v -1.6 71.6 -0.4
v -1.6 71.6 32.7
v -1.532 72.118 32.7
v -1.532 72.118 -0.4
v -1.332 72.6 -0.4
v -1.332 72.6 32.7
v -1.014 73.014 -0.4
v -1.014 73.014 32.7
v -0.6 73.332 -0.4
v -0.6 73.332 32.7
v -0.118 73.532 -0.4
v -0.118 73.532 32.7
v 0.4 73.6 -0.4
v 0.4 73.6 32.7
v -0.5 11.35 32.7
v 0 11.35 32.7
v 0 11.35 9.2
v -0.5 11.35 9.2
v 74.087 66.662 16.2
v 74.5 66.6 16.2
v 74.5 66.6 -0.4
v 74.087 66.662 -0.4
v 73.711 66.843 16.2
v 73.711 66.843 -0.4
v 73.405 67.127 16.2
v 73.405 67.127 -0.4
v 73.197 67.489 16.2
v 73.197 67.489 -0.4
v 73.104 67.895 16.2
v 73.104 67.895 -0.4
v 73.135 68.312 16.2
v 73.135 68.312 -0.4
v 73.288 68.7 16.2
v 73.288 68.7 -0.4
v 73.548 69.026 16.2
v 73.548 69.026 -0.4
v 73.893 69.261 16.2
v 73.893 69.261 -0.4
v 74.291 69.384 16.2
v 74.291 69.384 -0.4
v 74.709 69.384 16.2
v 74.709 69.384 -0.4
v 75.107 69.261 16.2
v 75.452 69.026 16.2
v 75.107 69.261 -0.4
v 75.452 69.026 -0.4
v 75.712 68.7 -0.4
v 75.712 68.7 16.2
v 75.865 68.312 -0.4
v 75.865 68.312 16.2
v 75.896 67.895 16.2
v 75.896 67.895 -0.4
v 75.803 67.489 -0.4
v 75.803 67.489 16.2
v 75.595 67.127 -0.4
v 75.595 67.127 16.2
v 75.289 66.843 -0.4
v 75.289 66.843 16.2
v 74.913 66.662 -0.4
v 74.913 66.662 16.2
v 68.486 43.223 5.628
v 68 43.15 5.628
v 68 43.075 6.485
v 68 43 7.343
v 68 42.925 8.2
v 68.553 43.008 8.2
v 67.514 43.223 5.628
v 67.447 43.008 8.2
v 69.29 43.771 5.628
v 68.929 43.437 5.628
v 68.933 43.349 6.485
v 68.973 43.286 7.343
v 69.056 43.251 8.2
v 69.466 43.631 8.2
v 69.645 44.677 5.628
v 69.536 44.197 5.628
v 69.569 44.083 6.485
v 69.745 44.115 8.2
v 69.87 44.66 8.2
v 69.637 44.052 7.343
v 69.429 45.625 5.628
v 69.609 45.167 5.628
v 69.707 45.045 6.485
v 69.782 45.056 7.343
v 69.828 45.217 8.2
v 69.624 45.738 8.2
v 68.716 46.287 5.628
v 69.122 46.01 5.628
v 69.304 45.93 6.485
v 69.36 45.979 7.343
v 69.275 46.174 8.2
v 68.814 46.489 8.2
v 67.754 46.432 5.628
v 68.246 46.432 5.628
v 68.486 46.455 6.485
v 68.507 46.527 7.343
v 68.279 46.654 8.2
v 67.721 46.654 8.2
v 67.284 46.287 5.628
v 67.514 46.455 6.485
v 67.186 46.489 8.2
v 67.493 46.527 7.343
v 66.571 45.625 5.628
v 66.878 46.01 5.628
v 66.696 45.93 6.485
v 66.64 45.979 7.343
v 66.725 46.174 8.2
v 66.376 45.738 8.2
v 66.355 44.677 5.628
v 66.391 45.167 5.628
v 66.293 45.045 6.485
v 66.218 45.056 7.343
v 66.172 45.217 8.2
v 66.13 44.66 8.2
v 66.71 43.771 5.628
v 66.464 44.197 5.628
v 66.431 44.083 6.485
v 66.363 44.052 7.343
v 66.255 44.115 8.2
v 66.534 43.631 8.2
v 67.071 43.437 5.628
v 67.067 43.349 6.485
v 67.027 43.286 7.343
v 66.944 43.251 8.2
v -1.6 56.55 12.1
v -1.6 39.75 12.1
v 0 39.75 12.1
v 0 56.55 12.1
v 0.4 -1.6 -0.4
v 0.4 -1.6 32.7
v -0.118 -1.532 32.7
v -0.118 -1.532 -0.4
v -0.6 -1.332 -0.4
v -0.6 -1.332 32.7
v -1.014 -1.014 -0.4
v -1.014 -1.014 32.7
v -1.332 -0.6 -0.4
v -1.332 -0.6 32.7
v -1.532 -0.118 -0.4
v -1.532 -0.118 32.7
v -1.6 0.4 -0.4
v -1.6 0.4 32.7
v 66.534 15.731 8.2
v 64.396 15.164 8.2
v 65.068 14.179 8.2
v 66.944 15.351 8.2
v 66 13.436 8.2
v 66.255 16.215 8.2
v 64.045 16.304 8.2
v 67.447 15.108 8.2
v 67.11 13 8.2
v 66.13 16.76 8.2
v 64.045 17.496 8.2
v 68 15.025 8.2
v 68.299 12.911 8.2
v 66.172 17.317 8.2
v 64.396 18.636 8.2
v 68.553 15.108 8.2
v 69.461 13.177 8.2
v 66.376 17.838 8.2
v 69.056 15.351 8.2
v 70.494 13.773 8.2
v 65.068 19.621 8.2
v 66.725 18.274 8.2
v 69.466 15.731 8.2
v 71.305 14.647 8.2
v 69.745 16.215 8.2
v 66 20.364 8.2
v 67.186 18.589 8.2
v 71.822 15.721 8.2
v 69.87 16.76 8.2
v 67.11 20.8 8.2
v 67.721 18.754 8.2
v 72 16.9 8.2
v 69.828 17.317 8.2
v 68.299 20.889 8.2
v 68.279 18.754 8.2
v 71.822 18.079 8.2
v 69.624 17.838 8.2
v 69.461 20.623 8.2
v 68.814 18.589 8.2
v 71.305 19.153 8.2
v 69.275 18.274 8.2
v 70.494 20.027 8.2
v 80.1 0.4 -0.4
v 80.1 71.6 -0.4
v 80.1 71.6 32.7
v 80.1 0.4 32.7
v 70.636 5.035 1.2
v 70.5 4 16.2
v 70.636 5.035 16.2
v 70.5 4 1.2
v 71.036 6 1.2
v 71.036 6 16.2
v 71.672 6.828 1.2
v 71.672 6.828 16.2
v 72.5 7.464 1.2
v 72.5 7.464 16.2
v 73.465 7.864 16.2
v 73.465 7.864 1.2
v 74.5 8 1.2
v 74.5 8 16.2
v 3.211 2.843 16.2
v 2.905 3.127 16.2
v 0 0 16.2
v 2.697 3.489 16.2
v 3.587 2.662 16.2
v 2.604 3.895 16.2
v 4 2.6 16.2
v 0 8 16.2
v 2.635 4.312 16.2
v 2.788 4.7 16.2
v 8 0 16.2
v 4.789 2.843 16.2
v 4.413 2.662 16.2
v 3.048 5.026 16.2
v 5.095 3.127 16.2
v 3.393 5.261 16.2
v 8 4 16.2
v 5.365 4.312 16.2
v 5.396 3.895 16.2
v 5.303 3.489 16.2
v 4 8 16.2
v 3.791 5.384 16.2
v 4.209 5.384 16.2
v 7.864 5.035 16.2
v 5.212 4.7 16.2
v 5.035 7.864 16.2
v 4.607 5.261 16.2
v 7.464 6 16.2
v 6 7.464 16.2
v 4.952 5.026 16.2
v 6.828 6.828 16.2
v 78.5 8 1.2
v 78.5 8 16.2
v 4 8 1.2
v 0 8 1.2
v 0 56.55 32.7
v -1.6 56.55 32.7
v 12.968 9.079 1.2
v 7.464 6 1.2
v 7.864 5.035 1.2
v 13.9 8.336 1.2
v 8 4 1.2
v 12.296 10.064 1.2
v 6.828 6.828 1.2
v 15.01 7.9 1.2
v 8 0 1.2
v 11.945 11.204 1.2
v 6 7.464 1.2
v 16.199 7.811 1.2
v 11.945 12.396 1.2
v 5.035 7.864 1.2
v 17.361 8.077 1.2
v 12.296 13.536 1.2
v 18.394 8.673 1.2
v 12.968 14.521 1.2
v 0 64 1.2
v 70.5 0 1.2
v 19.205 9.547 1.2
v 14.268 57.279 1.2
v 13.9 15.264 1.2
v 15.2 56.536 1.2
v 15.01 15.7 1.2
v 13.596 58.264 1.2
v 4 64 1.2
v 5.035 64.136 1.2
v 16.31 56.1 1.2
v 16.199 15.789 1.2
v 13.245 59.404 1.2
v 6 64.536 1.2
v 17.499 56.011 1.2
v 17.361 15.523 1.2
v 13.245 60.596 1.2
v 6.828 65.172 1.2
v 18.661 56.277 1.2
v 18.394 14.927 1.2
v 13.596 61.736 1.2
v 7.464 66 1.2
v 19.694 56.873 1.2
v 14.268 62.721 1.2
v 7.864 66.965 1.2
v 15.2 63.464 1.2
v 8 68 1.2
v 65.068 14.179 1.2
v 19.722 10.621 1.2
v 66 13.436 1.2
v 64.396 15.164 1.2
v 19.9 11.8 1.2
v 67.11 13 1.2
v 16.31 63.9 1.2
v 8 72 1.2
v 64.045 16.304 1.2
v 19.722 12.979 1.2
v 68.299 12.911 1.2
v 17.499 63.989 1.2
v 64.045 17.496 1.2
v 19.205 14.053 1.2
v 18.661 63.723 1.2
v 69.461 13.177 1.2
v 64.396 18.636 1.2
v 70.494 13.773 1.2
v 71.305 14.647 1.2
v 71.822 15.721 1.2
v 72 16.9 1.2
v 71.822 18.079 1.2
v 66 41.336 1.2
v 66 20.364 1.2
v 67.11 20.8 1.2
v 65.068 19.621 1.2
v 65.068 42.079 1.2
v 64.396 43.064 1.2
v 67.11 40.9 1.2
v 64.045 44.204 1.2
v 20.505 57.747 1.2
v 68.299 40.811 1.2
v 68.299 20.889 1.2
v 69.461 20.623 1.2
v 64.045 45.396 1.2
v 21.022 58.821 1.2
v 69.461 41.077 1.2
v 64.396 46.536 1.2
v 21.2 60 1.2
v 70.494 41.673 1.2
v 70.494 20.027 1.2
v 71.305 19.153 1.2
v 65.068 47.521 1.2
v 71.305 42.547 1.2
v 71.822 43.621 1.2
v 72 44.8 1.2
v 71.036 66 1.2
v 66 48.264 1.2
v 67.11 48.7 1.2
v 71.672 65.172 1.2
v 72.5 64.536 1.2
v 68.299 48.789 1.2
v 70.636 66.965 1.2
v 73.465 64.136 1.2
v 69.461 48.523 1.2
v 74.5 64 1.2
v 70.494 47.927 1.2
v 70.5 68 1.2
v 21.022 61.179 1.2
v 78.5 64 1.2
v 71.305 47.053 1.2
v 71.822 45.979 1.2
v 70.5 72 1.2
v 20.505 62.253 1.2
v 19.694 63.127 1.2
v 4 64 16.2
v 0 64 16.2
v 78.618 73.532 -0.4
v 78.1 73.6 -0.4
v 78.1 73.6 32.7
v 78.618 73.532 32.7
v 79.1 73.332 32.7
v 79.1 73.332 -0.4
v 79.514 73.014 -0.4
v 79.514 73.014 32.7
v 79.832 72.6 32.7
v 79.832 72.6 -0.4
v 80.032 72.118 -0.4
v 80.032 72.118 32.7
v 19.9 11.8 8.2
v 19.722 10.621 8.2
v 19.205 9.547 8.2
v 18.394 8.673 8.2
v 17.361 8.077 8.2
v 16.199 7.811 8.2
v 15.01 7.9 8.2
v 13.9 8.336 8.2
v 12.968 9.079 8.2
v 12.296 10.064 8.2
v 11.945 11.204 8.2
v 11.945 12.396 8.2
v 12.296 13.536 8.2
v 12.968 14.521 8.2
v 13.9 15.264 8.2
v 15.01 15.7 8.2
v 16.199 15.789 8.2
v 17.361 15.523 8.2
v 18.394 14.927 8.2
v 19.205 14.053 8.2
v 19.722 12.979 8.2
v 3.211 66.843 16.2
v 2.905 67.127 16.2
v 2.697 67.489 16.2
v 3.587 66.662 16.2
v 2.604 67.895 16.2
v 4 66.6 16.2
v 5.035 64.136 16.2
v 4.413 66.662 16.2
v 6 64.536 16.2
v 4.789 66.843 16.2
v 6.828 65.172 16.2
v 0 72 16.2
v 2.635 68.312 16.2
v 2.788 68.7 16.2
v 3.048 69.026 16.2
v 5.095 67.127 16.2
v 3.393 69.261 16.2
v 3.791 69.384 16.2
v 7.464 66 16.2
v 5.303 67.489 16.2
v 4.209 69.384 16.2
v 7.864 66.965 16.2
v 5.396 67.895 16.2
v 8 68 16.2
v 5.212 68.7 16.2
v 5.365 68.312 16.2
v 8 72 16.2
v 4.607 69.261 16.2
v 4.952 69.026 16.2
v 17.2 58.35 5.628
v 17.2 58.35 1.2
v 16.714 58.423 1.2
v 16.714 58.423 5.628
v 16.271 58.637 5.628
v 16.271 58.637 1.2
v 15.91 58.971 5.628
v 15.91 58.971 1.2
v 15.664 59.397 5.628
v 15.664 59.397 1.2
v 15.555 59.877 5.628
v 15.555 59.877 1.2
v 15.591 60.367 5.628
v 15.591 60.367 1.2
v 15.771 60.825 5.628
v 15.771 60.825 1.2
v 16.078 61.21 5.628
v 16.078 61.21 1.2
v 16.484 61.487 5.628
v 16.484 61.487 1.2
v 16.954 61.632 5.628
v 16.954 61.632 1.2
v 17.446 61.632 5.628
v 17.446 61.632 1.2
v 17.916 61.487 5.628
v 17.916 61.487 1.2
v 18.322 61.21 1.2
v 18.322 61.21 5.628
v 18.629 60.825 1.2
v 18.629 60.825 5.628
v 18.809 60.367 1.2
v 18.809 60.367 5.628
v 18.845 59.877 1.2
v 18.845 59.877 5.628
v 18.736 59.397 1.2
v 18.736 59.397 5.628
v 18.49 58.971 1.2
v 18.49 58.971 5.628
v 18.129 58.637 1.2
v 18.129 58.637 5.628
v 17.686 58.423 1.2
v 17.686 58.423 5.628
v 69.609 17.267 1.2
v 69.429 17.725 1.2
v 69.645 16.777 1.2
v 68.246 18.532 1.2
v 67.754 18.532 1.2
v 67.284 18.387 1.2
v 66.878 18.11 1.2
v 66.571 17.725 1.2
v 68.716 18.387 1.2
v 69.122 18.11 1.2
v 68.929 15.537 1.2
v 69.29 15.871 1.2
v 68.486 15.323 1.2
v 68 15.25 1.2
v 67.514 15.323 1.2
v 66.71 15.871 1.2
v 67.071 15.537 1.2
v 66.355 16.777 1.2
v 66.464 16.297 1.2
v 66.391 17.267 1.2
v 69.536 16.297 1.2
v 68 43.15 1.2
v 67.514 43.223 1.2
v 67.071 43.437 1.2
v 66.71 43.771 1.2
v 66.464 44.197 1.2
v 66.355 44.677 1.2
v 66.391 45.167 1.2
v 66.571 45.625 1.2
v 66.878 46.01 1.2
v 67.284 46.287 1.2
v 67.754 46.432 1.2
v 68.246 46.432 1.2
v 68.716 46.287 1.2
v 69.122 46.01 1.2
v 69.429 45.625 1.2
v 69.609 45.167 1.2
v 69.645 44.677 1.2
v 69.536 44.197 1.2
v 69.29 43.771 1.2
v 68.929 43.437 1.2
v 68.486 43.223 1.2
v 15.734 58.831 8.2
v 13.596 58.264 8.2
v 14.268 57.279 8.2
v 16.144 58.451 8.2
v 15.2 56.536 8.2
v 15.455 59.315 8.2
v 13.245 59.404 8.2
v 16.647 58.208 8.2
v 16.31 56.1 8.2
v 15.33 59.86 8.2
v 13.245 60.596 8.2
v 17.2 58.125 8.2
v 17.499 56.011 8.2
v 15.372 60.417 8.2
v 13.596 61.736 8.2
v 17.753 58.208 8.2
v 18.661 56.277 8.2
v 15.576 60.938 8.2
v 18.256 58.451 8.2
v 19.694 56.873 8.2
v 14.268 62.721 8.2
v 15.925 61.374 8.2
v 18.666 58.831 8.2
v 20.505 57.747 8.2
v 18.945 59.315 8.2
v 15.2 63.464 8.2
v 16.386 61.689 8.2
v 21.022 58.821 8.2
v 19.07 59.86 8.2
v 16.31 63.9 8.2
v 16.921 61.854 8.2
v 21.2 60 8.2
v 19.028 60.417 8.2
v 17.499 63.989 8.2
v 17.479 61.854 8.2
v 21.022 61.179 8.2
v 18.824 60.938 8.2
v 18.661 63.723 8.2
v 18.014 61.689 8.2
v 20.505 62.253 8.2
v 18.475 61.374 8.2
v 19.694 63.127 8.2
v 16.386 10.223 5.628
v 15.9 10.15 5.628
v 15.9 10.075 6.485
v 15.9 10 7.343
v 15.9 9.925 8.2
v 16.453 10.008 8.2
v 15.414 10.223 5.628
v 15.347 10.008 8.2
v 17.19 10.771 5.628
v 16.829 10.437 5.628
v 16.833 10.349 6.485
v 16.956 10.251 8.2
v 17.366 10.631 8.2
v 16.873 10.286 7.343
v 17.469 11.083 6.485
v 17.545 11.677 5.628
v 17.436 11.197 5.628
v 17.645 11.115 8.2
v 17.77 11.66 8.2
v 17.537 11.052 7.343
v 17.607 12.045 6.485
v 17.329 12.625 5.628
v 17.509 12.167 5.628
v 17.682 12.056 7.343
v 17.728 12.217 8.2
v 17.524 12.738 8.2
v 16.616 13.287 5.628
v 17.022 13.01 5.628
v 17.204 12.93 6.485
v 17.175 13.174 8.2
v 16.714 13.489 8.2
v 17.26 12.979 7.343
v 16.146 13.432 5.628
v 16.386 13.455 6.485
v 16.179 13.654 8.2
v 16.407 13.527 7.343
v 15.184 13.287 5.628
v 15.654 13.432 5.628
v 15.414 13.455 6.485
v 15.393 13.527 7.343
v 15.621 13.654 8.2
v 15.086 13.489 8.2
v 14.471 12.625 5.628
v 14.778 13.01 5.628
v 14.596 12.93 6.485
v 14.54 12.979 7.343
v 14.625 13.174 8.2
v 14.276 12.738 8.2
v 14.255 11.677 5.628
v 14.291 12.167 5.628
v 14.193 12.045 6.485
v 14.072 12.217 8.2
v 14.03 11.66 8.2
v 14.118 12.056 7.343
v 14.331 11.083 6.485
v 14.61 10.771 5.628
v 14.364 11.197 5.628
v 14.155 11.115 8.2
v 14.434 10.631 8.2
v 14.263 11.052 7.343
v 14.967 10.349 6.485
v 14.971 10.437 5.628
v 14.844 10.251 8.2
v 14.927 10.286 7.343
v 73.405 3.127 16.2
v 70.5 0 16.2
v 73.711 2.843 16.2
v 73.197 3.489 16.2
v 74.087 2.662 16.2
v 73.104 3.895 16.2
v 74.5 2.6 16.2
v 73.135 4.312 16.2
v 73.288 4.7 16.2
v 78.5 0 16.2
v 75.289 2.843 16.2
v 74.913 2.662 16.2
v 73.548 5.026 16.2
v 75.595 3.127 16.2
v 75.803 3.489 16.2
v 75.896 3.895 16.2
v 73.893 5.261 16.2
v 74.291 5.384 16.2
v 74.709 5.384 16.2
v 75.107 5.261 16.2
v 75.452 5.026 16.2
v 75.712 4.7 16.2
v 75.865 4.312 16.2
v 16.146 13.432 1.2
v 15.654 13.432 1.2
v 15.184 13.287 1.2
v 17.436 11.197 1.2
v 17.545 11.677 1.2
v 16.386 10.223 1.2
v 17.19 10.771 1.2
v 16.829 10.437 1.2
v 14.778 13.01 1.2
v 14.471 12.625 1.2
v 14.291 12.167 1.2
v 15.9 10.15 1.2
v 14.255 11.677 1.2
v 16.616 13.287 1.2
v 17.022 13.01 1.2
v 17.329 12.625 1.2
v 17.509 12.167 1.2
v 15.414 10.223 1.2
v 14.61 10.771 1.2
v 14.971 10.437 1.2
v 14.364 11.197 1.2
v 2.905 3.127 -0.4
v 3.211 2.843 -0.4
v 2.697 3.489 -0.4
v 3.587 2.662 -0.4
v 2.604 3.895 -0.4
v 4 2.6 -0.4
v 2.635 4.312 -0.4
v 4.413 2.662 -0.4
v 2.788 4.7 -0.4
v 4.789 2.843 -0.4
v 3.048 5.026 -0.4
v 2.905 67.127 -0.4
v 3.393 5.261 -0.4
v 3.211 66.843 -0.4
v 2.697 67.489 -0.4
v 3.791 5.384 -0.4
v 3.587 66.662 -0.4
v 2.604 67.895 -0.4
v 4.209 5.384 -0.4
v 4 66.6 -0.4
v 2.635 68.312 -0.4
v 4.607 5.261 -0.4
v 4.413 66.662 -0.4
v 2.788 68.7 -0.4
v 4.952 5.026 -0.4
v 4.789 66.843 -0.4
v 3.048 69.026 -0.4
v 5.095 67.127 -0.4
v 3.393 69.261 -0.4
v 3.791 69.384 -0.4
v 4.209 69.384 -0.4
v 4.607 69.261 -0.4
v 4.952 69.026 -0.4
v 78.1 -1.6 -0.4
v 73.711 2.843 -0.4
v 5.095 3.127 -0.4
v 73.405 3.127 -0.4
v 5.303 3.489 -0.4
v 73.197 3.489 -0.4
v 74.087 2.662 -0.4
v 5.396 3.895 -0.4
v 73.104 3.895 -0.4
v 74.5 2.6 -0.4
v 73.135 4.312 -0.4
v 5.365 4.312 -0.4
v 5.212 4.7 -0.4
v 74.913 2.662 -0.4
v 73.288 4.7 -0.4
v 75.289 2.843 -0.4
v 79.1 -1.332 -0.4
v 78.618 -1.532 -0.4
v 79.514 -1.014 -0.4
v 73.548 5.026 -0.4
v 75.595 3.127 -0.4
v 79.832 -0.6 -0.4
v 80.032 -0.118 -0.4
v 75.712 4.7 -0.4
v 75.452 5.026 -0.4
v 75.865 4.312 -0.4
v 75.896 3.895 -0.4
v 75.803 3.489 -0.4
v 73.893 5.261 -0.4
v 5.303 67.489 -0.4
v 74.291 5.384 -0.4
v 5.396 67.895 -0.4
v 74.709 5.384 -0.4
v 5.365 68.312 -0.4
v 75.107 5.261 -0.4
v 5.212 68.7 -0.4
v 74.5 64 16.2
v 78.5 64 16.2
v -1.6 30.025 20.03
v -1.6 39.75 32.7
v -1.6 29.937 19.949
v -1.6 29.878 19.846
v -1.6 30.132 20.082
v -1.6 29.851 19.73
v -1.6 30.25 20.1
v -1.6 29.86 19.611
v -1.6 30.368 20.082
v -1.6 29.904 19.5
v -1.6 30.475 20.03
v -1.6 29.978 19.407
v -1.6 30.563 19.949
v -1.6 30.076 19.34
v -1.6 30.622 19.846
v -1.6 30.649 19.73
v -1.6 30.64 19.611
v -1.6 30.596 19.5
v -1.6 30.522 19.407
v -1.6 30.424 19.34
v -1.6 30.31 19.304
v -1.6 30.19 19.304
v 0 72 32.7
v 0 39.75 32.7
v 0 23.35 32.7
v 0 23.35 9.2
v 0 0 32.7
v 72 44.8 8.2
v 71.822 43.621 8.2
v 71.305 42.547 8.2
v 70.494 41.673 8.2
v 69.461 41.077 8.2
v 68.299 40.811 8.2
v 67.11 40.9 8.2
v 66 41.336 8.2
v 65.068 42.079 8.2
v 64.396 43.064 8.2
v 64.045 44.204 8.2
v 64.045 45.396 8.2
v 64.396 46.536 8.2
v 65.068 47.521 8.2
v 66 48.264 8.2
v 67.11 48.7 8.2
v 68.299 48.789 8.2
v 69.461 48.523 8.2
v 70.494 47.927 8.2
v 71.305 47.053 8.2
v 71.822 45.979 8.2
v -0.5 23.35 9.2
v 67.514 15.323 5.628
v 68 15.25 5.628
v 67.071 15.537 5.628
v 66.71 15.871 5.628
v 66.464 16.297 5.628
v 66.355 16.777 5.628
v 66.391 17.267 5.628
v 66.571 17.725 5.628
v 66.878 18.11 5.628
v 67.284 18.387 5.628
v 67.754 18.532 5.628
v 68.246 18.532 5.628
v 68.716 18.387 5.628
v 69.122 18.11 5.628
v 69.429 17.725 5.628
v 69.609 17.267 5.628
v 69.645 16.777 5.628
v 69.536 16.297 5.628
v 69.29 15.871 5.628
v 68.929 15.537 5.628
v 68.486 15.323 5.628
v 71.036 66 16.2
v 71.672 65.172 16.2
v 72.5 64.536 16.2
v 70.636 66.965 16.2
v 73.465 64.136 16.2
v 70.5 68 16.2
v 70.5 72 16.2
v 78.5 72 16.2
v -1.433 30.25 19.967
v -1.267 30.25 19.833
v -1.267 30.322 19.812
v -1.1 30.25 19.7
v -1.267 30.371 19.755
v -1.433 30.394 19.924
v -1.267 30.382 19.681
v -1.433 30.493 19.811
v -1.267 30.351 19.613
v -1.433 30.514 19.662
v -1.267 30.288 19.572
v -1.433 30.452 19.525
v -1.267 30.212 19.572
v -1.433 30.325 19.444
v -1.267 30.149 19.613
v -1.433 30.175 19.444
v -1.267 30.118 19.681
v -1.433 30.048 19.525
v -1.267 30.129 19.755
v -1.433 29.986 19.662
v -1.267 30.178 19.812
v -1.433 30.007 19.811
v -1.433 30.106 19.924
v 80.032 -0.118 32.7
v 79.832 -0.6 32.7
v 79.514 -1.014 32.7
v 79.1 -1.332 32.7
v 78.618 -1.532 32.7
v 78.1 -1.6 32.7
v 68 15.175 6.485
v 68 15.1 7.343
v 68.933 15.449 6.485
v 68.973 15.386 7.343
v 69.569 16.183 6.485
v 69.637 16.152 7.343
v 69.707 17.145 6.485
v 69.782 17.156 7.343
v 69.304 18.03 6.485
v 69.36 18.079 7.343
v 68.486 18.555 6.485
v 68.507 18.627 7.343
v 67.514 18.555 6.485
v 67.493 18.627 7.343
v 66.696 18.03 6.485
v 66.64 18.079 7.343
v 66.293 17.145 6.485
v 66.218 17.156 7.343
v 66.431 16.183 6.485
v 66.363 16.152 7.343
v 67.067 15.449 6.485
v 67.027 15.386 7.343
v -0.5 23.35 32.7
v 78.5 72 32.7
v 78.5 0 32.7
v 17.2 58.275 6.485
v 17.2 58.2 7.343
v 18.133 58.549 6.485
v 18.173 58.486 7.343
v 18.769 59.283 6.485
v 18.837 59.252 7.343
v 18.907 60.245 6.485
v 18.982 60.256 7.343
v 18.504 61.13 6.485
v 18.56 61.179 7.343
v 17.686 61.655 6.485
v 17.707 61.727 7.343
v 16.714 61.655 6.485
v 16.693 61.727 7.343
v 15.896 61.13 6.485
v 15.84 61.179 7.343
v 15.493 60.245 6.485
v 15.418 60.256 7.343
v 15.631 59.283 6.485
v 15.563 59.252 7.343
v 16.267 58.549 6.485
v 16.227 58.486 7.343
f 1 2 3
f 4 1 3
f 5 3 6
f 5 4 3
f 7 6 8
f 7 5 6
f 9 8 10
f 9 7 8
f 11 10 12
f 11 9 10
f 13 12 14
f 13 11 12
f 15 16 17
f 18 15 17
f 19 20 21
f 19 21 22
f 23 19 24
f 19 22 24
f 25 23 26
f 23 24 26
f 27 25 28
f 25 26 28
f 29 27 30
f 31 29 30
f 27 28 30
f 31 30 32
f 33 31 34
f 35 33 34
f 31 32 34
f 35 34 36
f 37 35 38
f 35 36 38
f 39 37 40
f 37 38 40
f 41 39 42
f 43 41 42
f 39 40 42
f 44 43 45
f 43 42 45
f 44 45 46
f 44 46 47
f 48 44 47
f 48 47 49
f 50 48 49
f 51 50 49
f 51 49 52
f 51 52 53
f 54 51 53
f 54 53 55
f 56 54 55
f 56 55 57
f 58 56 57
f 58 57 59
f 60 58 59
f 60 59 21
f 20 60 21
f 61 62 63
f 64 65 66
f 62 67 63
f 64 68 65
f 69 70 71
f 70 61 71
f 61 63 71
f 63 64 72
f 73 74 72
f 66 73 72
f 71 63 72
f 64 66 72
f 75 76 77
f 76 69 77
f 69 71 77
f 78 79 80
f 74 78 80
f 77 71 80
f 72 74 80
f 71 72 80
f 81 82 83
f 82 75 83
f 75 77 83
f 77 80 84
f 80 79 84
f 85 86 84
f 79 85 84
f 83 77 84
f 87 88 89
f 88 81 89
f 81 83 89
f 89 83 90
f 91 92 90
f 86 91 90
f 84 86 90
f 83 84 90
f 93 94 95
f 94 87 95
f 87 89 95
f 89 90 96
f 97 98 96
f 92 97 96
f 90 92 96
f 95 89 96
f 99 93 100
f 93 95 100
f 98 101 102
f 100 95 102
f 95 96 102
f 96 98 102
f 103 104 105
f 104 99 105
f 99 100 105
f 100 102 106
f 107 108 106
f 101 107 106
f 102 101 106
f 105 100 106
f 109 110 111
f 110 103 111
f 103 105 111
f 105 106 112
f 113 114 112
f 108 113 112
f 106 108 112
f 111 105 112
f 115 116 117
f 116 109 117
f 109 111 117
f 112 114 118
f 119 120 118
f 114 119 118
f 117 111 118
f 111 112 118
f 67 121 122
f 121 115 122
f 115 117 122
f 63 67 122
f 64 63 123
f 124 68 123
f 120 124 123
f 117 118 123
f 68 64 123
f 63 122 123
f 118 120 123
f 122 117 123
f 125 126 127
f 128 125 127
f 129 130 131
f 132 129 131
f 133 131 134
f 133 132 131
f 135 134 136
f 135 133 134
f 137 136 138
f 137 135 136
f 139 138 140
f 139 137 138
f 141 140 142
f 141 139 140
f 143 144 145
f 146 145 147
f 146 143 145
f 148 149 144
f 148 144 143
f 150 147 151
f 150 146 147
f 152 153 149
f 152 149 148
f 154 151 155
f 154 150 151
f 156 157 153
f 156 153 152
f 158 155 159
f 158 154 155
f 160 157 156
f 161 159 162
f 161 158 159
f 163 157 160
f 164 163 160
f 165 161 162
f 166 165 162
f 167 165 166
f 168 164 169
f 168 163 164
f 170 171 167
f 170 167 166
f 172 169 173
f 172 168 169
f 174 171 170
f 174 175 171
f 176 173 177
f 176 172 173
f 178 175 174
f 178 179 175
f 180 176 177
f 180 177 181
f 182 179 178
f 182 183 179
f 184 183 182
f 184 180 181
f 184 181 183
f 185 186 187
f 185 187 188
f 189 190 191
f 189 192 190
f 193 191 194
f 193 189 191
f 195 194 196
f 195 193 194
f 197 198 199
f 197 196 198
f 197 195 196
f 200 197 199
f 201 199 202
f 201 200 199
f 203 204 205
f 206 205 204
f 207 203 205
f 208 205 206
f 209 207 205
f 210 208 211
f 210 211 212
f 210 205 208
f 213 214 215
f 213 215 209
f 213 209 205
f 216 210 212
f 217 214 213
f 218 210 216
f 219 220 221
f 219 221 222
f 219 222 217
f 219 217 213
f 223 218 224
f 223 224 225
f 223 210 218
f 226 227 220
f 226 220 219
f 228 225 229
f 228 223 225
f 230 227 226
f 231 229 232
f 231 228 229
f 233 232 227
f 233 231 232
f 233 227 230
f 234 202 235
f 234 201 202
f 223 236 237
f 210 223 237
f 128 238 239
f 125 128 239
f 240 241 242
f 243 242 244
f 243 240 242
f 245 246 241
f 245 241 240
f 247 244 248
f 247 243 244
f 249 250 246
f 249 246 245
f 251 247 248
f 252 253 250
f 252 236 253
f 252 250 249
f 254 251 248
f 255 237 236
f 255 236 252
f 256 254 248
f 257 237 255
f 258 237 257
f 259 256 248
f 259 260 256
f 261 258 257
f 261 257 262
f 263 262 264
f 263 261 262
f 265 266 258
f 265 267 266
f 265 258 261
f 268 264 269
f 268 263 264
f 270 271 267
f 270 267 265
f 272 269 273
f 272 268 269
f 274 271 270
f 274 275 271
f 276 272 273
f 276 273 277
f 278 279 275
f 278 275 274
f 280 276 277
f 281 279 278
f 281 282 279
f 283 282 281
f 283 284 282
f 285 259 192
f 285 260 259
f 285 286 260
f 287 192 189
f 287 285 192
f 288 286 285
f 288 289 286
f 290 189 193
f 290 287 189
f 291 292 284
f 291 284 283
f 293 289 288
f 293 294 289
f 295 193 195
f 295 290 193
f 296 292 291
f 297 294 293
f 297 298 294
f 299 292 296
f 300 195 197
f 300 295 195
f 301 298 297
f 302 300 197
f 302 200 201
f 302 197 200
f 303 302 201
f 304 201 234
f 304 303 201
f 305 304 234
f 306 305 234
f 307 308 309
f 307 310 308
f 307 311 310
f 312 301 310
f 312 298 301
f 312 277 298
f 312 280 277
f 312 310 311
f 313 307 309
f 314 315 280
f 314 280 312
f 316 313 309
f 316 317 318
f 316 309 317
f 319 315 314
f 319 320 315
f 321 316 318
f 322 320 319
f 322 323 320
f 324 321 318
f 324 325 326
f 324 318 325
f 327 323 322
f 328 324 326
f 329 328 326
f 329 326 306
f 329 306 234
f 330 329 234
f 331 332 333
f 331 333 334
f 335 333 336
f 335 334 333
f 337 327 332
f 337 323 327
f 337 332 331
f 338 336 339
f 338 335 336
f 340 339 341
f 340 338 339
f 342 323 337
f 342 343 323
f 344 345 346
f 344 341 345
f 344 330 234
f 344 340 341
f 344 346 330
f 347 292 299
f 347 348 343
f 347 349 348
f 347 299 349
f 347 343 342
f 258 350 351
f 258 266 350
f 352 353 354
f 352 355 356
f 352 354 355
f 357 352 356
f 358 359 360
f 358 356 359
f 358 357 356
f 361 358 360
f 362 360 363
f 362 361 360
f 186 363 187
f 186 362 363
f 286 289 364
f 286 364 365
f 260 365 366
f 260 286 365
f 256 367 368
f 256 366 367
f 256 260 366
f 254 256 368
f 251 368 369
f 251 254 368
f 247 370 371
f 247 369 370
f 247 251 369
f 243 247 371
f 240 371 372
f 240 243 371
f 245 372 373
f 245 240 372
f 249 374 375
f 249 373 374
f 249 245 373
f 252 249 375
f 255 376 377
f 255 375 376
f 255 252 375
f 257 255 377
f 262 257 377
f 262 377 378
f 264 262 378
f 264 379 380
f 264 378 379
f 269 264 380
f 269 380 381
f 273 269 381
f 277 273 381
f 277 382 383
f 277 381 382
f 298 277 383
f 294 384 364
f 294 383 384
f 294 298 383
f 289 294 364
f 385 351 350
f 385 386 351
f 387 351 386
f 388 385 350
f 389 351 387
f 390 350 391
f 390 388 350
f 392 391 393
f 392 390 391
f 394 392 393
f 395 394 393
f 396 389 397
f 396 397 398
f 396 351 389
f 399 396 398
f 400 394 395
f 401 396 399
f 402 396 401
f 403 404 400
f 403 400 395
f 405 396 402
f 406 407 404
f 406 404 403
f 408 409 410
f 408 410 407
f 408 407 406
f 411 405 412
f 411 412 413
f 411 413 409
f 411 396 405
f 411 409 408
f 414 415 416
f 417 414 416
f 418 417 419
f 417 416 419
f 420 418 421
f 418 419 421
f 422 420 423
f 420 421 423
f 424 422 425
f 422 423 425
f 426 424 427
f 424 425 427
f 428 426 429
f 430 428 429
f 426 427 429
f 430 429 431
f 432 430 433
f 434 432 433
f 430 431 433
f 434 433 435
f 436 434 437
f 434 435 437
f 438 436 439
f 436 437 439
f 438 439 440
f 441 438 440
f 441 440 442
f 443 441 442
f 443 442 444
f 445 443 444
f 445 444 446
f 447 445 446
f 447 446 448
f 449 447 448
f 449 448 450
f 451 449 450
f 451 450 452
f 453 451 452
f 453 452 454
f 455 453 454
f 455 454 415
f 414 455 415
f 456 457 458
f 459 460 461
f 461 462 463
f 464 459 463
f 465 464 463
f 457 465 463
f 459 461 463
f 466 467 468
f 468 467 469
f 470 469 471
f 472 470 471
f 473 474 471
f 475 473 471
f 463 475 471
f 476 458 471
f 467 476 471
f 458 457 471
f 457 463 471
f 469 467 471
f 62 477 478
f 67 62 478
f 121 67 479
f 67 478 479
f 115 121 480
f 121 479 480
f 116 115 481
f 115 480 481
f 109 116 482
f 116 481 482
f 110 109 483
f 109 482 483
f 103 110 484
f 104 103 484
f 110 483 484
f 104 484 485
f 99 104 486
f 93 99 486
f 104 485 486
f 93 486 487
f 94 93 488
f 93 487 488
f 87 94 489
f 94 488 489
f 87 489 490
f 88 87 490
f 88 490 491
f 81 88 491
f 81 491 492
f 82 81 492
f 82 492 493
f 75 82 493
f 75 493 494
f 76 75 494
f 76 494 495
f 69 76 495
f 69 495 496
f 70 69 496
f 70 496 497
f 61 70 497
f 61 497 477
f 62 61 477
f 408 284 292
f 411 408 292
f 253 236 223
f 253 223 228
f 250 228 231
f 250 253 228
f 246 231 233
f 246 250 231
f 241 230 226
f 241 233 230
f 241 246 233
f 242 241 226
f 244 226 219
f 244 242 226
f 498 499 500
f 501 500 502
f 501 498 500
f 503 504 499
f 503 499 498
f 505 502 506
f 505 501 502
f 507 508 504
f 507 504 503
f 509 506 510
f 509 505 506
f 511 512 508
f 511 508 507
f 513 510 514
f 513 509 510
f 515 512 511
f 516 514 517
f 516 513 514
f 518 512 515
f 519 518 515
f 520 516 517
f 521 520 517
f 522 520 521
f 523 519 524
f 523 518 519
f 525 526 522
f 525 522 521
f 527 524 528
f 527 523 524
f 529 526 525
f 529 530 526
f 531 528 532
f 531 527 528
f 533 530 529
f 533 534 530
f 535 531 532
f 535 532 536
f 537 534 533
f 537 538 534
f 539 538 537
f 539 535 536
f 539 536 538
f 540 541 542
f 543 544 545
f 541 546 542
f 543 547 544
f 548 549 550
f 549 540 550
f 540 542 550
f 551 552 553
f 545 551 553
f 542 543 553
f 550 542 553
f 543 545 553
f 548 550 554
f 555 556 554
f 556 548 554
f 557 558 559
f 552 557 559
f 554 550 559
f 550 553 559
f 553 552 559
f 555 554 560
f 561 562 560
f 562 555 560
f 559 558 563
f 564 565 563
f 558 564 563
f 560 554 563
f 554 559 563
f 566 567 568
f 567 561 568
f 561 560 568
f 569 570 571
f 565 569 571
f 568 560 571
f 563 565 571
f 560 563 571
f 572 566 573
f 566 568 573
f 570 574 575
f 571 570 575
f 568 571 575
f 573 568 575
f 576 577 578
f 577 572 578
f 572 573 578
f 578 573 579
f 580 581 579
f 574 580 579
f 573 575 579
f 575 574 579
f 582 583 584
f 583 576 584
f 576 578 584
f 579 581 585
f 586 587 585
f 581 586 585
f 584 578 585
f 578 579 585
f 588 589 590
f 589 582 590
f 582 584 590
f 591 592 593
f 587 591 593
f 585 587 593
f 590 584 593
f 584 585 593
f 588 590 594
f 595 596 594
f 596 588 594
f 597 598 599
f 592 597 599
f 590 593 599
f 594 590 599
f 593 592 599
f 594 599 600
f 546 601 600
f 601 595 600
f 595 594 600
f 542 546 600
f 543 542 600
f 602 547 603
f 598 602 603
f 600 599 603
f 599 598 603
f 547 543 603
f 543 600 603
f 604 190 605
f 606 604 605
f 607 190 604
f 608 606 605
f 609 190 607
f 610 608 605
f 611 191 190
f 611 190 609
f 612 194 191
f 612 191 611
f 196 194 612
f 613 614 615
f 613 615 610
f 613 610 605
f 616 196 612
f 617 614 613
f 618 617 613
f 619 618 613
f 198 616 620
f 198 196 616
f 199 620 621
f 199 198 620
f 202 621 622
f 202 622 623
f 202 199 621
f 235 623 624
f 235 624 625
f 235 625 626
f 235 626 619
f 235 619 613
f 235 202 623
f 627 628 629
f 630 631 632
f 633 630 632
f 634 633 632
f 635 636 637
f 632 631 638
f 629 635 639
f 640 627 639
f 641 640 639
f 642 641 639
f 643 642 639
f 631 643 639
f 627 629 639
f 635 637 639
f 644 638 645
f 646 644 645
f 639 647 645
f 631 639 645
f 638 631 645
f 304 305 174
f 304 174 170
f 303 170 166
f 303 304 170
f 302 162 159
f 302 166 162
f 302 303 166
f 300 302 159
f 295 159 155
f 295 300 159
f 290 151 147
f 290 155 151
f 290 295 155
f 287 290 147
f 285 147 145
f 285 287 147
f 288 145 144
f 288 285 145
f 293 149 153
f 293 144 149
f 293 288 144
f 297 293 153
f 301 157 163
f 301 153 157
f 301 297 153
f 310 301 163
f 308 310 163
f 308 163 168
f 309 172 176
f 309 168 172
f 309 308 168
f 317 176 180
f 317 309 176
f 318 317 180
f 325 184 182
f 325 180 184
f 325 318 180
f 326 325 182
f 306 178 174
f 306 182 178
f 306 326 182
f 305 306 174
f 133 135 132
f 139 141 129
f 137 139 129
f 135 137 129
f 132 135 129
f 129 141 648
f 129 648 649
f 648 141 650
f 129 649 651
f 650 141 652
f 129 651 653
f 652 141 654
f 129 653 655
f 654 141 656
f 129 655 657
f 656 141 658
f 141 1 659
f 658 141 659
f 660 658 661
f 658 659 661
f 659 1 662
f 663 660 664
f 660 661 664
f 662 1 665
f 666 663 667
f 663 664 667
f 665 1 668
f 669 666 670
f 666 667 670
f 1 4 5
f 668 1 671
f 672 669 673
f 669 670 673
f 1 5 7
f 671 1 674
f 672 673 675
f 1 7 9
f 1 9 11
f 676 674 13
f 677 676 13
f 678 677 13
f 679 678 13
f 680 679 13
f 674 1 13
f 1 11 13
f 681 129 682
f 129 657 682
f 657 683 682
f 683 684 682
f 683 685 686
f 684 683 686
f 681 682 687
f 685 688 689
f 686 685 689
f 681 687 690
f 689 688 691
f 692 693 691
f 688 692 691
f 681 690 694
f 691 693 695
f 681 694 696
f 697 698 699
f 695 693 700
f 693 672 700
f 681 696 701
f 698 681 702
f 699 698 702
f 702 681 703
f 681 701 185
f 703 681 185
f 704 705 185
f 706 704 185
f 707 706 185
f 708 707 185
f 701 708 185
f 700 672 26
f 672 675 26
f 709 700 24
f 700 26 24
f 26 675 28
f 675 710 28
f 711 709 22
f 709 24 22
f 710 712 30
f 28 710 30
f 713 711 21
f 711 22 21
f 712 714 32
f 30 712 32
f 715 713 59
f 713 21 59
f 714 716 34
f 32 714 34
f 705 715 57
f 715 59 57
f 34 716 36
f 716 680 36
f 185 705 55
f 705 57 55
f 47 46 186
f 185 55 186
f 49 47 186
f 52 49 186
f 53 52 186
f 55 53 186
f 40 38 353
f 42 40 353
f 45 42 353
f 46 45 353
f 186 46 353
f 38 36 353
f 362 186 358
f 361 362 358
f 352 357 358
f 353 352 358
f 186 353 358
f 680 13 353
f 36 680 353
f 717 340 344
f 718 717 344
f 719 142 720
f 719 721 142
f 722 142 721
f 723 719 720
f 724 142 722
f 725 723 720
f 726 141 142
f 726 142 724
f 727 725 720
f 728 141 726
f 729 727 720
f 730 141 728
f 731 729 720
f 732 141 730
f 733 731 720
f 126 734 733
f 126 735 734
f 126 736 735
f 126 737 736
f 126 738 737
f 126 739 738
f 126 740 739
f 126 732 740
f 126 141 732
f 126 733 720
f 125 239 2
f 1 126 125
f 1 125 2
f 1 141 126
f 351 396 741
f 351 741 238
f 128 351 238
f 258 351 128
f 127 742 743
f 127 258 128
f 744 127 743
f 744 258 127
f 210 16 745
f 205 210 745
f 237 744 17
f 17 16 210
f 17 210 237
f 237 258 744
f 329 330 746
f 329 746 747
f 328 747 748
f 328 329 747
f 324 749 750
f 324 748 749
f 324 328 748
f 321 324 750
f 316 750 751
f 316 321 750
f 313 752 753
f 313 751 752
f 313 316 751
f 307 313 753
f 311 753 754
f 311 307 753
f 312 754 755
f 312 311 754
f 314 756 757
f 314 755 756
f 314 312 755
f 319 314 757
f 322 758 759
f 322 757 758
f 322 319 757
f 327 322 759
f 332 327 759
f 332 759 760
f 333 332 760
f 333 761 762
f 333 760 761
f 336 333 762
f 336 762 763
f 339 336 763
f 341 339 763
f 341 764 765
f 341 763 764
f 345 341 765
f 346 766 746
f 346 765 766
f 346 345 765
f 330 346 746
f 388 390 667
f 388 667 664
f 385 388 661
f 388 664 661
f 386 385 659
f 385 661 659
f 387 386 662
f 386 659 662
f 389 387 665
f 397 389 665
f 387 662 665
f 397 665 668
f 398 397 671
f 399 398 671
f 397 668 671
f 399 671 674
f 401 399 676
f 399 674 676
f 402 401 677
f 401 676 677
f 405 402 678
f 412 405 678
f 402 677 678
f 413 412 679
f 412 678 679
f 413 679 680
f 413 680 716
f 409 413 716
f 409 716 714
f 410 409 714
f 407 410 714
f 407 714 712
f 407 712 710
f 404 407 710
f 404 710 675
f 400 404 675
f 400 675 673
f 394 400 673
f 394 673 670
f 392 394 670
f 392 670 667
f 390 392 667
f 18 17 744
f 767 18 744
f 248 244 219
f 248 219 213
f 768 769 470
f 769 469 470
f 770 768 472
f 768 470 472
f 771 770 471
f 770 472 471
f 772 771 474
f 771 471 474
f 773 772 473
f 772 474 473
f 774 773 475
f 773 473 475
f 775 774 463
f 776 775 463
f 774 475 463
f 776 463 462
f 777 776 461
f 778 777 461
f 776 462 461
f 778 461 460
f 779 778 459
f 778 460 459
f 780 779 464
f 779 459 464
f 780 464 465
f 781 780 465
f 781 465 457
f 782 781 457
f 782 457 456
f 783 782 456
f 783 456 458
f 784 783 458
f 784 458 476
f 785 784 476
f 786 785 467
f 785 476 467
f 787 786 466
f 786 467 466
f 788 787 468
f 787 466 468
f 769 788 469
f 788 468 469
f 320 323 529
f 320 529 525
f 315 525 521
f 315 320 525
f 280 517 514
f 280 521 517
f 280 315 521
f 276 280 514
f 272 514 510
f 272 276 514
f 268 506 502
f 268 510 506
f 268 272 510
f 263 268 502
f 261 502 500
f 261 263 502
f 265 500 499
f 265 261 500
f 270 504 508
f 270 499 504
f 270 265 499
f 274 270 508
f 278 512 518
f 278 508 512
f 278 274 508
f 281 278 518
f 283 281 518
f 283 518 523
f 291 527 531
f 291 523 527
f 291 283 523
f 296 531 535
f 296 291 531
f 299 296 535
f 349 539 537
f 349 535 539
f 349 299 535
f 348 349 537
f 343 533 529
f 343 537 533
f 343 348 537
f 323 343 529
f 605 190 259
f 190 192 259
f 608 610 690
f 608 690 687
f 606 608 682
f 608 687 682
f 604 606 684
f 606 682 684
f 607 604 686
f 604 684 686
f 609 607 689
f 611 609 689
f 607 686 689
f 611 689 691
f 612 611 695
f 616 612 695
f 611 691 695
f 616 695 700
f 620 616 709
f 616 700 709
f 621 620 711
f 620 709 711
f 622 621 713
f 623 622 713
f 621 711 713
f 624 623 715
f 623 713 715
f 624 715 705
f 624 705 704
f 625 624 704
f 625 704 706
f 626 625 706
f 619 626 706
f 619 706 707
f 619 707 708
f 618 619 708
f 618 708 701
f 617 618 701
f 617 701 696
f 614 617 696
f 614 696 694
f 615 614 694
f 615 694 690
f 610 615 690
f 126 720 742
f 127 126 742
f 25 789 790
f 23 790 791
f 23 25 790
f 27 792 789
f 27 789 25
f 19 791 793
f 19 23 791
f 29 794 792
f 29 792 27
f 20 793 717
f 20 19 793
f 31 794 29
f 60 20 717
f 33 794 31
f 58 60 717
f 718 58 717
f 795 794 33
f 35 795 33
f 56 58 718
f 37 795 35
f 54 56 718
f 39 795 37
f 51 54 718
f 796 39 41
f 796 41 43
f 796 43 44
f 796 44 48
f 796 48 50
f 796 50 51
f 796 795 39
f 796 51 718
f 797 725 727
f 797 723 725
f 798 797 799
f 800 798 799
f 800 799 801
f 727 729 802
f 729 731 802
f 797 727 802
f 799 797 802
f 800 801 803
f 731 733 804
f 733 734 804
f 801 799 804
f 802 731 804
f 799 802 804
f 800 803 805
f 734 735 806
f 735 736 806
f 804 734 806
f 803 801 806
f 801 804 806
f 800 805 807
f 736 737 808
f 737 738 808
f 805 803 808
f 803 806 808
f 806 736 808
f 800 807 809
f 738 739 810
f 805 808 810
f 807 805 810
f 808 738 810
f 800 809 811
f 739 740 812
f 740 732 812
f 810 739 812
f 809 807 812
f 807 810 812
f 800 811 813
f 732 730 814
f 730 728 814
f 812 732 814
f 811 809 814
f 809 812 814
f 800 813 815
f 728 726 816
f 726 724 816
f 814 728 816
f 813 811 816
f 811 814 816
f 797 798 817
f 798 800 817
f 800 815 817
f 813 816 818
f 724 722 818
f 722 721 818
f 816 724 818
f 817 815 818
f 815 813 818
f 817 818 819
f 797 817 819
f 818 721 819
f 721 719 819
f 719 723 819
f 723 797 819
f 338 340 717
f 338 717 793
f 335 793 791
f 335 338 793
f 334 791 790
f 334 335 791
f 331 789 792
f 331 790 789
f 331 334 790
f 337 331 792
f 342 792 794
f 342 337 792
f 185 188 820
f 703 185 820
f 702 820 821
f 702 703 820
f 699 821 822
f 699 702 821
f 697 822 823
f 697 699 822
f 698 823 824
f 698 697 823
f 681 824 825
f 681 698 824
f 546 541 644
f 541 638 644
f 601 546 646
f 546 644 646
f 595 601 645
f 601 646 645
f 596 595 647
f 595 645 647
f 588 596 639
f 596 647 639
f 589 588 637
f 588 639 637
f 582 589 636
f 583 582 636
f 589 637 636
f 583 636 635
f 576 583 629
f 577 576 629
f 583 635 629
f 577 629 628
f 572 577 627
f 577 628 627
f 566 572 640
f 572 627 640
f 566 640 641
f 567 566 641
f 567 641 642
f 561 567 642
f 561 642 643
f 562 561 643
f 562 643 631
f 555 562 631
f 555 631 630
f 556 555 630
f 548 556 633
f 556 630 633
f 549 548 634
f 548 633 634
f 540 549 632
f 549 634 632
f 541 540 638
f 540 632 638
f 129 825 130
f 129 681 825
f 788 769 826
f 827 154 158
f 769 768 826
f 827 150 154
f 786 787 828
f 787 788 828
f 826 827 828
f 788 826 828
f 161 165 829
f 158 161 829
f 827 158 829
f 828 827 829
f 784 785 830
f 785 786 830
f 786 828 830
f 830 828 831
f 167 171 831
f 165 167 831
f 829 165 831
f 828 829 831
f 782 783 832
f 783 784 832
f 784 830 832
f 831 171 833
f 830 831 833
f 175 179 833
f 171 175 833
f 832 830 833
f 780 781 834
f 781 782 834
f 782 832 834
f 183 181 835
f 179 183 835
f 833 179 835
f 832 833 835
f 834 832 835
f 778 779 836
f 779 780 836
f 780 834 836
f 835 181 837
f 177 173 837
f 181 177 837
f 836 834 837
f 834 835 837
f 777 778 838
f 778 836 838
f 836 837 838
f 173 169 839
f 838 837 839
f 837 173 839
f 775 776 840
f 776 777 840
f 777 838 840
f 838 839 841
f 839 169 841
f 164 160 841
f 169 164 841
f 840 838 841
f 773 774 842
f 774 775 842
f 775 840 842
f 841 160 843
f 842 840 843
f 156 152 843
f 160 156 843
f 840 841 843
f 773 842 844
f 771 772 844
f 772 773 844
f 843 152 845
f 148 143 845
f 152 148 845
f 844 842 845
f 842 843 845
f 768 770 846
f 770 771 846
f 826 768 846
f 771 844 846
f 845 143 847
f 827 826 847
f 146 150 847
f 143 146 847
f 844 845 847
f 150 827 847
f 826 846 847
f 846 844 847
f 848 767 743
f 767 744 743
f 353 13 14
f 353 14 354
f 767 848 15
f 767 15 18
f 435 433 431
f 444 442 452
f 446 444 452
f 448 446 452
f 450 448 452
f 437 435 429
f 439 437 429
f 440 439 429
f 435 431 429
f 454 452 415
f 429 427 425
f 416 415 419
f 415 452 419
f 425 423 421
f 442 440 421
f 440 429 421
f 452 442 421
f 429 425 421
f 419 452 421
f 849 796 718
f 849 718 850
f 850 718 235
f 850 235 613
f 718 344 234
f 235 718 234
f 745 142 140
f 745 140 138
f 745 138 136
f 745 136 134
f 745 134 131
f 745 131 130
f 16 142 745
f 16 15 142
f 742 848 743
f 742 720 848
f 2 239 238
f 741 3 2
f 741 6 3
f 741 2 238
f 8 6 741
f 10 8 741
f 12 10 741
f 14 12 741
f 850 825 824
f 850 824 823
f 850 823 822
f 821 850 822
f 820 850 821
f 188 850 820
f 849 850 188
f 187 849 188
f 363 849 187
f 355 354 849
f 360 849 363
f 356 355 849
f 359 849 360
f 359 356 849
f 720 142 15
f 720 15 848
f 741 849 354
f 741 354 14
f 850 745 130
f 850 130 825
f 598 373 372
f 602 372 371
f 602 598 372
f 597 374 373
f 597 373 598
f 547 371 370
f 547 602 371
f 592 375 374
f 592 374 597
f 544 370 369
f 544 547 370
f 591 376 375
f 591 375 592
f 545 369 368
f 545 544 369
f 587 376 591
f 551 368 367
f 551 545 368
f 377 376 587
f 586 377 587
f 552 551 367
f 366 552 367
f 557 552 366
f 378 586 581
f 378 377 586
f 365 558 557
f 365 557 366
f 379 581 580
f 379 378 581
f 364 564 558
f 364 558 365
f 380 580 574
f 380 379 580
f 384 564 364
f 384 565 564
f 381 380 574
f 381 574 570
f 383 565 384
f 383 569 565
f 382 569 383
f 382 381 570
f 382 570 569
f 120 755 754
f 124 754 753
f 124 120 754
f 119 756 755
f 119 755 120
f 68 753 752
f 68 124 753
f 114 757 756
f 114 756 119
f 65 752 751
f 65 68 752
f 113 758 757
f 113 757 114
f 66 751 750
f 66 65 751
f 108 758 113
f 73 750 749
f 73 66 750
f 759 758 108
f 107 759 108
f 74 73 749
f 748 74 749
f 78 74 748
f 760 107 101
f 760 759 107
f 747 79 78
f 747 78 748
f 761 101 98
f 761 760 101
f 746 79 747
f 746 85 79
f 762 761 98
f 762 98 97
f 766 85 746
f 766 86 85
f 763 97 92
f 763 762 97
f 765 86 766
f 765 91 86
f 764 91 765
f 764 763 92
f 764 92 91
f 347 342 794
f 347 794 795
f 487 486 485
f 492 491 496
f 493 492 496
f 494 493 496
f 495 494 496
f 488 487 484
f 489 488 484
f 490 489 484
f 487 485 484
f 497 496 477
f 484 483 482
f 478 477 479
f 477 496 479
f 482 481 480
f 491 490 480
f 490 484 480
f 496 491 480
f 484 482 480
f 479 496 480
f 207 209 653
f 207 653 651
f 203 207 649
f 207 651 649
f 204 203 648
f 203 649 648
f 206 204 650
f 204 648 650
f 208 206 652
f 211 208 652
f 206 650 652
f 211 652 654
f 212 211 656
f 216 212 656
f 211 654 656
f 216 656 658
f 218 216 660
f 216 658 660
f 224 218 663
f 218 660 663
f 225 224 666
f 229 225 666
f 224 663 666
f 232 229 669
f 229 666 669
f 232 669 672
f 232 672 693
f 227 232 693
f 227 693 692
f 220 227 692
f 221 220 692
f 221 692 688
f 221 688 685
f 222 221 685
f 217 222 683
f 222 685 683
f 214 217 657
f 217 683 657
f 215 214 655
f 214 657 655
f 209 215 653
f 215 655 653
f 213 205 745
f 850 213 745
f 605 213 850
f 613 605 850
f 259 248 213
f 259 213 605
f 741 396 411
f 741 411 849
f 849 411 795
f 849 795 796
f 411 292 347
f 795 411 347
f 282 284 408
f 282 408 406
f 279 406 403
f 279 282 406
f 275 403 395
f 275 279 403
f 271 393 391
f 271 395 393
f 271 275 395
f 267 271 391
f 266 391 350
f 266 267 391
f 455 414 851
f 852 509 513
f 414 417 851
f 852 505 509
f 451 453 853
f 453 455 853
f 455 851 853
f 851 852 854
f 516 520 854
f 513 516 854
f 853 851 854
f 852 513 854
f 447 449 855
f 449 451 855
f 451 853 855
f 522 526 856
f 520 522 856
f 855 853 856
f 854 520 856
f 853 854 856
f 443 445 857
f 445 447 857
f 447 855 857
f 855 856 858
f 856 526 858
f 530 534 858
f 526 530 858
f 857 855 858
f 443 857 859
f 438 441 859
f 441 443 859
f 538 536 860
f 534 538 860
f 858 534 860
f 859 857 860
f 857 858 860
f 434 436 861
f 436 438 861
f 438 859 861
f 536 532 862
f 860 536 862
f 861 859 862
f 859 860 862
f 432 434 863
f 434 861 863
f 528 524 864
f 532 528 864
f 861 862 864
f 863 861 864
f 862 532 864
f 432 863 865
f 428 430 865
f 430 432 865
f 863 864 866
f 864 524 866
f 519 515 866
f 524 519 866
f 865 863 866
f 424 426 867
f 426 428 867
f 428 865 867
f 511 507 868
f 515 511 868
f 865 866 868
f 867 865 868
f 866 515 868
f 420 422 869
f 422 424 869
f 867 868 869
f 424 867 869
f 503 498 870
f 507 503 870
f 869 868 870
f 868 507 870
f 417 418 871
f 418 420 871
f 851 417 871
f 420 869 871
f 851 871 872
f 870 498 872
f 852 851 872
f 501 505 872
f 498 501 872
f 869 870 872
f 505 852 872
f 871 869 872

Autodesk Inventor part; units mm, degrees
ref_plane "YZ Plane" through (0, 0, 0) normal (1, 0, 0) x (0, 1, 0)
ref_plane "XZ Plane" through (0, 0, 0) normal (0, 1, 0) x (-1, 0, 0)
sketch "Zakladna" plane through (0, 0, 0) normal (0, 0, 1) x (1, 0, 0)
  line L0 (0, 0) -> (78.5, 0)
  line L1 (78.5, 0) -> (78.5, 72)
  line L2 (78.5, 72) -> (0, 72)
  line L3 (0, 72) -> (0, 0)
  dimension "d0" = 78.5
  dimension "d1" = 72
extrude "Extrusion1" add sketch "Zakladna" along normal blind 1.2 and the other way blind 0.4
sketch "Uchyt_arduino" plane through (0, 0, 1.2) normal (0, 0, 1) x (1, 0, 0)
  circle A0 centre (17.2, 60) radius 4
  circle A1 centre (68, 44.8) radius 4
  circle A2 centre (68, 16.9) radius 4
  circle A3 centre (15.9, 11.8) radius 4
  line L0 (0, 72) -> (0, 0) projected
  dimension "d33" = 8
  dimension "d35" = 8
  dimension "d37" = 8
  dimension "d163" = 17.2
  dimension "d171" = 27.9
  dimension "d173" = 1.3
  dimension "d174" = 50.8
  dimension "d175" = 48.2
  dimension "d176" = 15.2
sketch "Spojeni_srouby" plane through (0, 0, 1.2) normal (0, 0, 1) x (1, 0, 0)
  line L0 (8, 4) -> (8, 0)
  arc A0 (8, 4) -> (4, 8) centre (4, 4) ccw
  line L1 (4, 8) -> (0, 8)
  line L2 (0, 72) -> (0, 0)
  line L3 (0, 8) -> (0, 0)
  line L4 (0, 0) -> (8, 0)
  line L5 (8, 68) -> (8, 72)
  arc A1 (4, 64) -> (8, 68) centre (4, 68) ccw
  line L6 (4, 64) -> (0, 64)
  line L7 (0, 0) -> (0, 72)
  line L8 (0, 64) -> (0, 72)
  line L9 (0, 72) -> (8, 72)
  line L10 (70.5, 4) -> (70.5, 0)
  arc A2 (74.5, 8) -> (70.5, 4) centre (74.5, 4) ccw
  line L11 (74.5, 8) -> (78.5, 8)
  line L12 (78.5, 8) -> (78.5, 0)
  line L13 (78.5, 0) -> (70.5, 0)
  line L14 (70.5, 68) -> (70.5, 72)
  arc A3 (70.5, 68) -> (74.5, 64) centre (74.5, 68) ccw
  line L15 (74.5, 64) -> (78.5, 64)
  line L16 (78.5, 64) -> (78.5, 72)
  line L17 (78.5, 72) -> (70.5, 72)
  line L18 (78.5, 0) -> (78.5, 72) projected
extrude "Extrusion2" add sketch "Uchyt_arduino" along normal blind 7
extrude "Extrusion5" add sketch "Spojeni_srouby" along normal blind 15
sketch "diry_srouby" plane through (0, 0, 16.2) normal (0, 0, 1) x (1, 0, 0)
  arc A0 (8, 4) -> (4, 8) centre (4, 4) ccw projected
  arc A1 (74.5, 8) -> (70.5, 4) centre (74.5, 4) ccw projected
  arc A2 (70.5, 68) -> (74.5, 64) centre (74.5, 68) ccw projected
  arc A3 (4, 64) -> (8, 68) centre (4, 68) ccw projected
  point P0 (0, 0)
hole "Hole6" at (4, 4, 16.2) at (74.5, 4, 16.2) at (74.5, 68, 16.2) at (4, 68, 16.2) direction (0, 0, -1) diameter 2.8 end through all
sketch "steny" plane through (0, 0, 1.2) normal (0, 0, 1) x (1, 0, 0)
  line L0 (0, 72) -> (0, 56.55)
  line L1 (0, 56.55) -> (-1.6, 56.55)
  line L2 (-1.6, 56.55) -> (-1.6, 72)
  line L3 (-1.6, 72) -> (-1.6, 73.6)
  line L4 (-1.6, 73.6) -> (80.1, 73.6)
  line L5 (80.1, 73.6) -> (80.1, 0)
  line L6 (80.1, 0) -> (80.1, -1.6)
  line L7 (80.1, -1.6) -> (0, -1.6)
  line L8 (0, -1.6) -> (-1.6, -1.6)
  line L9 (-1.6, -1.6) -> (-1.6, 39.75)
  line L10 (-1.6, 39.75) -> (0, 39.75)
  line L11 (0, 0) -> (0, 72) projected
  line L12 (0, 39.75) -> (0, 0)
  line L13 (0, 0) -> (78.5, 0)
  line L14 (8, 0) -> (78.5, 0) projected
  line L15 (78.5, 0) -> (0, 0) projected
  line L16 (78.5, 0) -> (0, 0)
  line L17 (78.5, 72) -> (78.5, 0) projected
  line L18 (0, 0) -> (78.5, 0)
  line L19 (78.5, 0) -> (78.5, 72)
  line L20 (0, 72) -> (78.5, 72) projected
  line L21 (78.5, 72) -> (0, 72)
  line L22 (92, 0) -> (92, 8) projected
  point P0 (78.5, 0)
  point P1 (78.5, 8)
  dimension "d133" = 15.45
  dimension "d134" = 1.6
  dimension "d135" = 1.6
  dimension "d137" = 1.6
  dimension "d138" = 1.6
  dimension "d139" = 16.8
  dimension "d179" = 1.6
extrude "Extrusion6" add sketch "steny" along normal blind 31.5 and the other way blind 1.6 contours L0 L1 L2 L3 L4 L5 L6 L7 L8 L9 L10 L11 L13 L17 L20
sketch "stena_RJ45" plane through (0, 0, 1.2) normal (0, 0, 1) x (1, 0, 0)
  line L0 (-1.6, 56.55) -> (0, 56.55) projected
  line L1 (0, 39.75) -> (-1.6, 39.75) projected
  line L2 (-1.6, 39.75) -> (0, 39.75)
  line L3 (0, 56.55) -> (0, 39.75) projected
  line L4 (0, 56.55) -> (0, 39.75)
  line L5 (0, 56.55) -> (-1.6, 56.55)
  line L6 (-1.6, 56.55) -> (-1.6, 39.75)
  line L7 (0, 39.75) -> (-1.6, 39.75)
  point P0 (0, 0)
extrude "Extrusion7" add sketch "stena_RJ45" along normal blind 10.9 and the other way blind 1.6
sketch "arduino_uchyt_zavitovaVlozka" plane through (17.2, 60, 8.2) normal (0, 0, 1) x (1, 0, 0)
  circle A0 centre (50.8, -43.1) radius 4 projected
  circle A1 centre (50.8, -15.2) radius 4 projected
  circle A2 centre (0, 0) radius 4 projected
  circle A3 centre (-1.3, -48.2) radius 4 projected
  point P0 (-17.2, -60)
hole "Hole7" at (68, 16.9, 8.2) at (68, 44.8, 8.2) at (17.2, 60, 8.2) at (15.9, 11.8, 8.2) direction (0, 0, -1) diameter 3.3 depth 7 countersink diameter 3.75 countersink angle 10
sketch "napajeni_znacka1" plane through (-1.6, -1.6, -0.4) normal (-1, 0, 0) x (0, 0, 1)
  circle A0 centre (20.1, 31.85) radius 0.4
  line L0 (12.5, 41.35) -> (33.1, 41.35) projected
  line L1 (0, 0) -> (0, 75.2) projected
  point P0 (0.4, 1.6)
  dimension "d155" = 0.8
  dimension "d156" = 9.5
  dimension "d157" = 20.1
ref_plane "napajeni_znacka2_rovina" through (-1.1, -1.6, -0.4) normal (-1, 0, 0) x (0, 0, 1)
sketch "napajeni_znacka2" plane through (-1.1, -1.6, -0.4) normal (-1, 0, 0) x (0, 0, 1)
  point P0 (0.4, 1.6)
  point P1 (20.1, 31.85)
  point P2 (20.1, 31.85)
loft "Loft4" cut profiles "napajeni_znacka1" section 2 point at (-1.1, 30.25, 19.7)
sketch "vyrez_nepouzity_jack" plane through (0, 8, 1.2) normal (1, 0, 0) x (0, 0, -1)
  line L0 (-8, 15.35) -> (-33, 15.35)
  line L1 (-33, 15.35) -> (-33, 3.35)
  line L2 (-33, 3.35) -> (-8, 3.35)
  line L3 (-8, 3.35) -> (-8, 15.35)
  line L4 (-10.9, 31.75) -> (-31.5, 31.75) projected
  line L5 (0, 56) -> (0, 0) projected
  point P0 (1.2, -8)
  dimension "d164" = 25
  dimension "d165" = 12
  dimension "d166" = 16.4
  dimension "d167" = 8
extrude "Extrusion8" cut sketch "vyrez_nepouzity_jack" against normal blind 0.5
fillet "Fillet1" radius 2 4 edges at (-1.6, -1.6, 16.15) (80.1, -1.6, 16.15) (-1.6, 73.6, 16.15) (80.1, 73.6, 16.15)
properties part number "case_bottom"
